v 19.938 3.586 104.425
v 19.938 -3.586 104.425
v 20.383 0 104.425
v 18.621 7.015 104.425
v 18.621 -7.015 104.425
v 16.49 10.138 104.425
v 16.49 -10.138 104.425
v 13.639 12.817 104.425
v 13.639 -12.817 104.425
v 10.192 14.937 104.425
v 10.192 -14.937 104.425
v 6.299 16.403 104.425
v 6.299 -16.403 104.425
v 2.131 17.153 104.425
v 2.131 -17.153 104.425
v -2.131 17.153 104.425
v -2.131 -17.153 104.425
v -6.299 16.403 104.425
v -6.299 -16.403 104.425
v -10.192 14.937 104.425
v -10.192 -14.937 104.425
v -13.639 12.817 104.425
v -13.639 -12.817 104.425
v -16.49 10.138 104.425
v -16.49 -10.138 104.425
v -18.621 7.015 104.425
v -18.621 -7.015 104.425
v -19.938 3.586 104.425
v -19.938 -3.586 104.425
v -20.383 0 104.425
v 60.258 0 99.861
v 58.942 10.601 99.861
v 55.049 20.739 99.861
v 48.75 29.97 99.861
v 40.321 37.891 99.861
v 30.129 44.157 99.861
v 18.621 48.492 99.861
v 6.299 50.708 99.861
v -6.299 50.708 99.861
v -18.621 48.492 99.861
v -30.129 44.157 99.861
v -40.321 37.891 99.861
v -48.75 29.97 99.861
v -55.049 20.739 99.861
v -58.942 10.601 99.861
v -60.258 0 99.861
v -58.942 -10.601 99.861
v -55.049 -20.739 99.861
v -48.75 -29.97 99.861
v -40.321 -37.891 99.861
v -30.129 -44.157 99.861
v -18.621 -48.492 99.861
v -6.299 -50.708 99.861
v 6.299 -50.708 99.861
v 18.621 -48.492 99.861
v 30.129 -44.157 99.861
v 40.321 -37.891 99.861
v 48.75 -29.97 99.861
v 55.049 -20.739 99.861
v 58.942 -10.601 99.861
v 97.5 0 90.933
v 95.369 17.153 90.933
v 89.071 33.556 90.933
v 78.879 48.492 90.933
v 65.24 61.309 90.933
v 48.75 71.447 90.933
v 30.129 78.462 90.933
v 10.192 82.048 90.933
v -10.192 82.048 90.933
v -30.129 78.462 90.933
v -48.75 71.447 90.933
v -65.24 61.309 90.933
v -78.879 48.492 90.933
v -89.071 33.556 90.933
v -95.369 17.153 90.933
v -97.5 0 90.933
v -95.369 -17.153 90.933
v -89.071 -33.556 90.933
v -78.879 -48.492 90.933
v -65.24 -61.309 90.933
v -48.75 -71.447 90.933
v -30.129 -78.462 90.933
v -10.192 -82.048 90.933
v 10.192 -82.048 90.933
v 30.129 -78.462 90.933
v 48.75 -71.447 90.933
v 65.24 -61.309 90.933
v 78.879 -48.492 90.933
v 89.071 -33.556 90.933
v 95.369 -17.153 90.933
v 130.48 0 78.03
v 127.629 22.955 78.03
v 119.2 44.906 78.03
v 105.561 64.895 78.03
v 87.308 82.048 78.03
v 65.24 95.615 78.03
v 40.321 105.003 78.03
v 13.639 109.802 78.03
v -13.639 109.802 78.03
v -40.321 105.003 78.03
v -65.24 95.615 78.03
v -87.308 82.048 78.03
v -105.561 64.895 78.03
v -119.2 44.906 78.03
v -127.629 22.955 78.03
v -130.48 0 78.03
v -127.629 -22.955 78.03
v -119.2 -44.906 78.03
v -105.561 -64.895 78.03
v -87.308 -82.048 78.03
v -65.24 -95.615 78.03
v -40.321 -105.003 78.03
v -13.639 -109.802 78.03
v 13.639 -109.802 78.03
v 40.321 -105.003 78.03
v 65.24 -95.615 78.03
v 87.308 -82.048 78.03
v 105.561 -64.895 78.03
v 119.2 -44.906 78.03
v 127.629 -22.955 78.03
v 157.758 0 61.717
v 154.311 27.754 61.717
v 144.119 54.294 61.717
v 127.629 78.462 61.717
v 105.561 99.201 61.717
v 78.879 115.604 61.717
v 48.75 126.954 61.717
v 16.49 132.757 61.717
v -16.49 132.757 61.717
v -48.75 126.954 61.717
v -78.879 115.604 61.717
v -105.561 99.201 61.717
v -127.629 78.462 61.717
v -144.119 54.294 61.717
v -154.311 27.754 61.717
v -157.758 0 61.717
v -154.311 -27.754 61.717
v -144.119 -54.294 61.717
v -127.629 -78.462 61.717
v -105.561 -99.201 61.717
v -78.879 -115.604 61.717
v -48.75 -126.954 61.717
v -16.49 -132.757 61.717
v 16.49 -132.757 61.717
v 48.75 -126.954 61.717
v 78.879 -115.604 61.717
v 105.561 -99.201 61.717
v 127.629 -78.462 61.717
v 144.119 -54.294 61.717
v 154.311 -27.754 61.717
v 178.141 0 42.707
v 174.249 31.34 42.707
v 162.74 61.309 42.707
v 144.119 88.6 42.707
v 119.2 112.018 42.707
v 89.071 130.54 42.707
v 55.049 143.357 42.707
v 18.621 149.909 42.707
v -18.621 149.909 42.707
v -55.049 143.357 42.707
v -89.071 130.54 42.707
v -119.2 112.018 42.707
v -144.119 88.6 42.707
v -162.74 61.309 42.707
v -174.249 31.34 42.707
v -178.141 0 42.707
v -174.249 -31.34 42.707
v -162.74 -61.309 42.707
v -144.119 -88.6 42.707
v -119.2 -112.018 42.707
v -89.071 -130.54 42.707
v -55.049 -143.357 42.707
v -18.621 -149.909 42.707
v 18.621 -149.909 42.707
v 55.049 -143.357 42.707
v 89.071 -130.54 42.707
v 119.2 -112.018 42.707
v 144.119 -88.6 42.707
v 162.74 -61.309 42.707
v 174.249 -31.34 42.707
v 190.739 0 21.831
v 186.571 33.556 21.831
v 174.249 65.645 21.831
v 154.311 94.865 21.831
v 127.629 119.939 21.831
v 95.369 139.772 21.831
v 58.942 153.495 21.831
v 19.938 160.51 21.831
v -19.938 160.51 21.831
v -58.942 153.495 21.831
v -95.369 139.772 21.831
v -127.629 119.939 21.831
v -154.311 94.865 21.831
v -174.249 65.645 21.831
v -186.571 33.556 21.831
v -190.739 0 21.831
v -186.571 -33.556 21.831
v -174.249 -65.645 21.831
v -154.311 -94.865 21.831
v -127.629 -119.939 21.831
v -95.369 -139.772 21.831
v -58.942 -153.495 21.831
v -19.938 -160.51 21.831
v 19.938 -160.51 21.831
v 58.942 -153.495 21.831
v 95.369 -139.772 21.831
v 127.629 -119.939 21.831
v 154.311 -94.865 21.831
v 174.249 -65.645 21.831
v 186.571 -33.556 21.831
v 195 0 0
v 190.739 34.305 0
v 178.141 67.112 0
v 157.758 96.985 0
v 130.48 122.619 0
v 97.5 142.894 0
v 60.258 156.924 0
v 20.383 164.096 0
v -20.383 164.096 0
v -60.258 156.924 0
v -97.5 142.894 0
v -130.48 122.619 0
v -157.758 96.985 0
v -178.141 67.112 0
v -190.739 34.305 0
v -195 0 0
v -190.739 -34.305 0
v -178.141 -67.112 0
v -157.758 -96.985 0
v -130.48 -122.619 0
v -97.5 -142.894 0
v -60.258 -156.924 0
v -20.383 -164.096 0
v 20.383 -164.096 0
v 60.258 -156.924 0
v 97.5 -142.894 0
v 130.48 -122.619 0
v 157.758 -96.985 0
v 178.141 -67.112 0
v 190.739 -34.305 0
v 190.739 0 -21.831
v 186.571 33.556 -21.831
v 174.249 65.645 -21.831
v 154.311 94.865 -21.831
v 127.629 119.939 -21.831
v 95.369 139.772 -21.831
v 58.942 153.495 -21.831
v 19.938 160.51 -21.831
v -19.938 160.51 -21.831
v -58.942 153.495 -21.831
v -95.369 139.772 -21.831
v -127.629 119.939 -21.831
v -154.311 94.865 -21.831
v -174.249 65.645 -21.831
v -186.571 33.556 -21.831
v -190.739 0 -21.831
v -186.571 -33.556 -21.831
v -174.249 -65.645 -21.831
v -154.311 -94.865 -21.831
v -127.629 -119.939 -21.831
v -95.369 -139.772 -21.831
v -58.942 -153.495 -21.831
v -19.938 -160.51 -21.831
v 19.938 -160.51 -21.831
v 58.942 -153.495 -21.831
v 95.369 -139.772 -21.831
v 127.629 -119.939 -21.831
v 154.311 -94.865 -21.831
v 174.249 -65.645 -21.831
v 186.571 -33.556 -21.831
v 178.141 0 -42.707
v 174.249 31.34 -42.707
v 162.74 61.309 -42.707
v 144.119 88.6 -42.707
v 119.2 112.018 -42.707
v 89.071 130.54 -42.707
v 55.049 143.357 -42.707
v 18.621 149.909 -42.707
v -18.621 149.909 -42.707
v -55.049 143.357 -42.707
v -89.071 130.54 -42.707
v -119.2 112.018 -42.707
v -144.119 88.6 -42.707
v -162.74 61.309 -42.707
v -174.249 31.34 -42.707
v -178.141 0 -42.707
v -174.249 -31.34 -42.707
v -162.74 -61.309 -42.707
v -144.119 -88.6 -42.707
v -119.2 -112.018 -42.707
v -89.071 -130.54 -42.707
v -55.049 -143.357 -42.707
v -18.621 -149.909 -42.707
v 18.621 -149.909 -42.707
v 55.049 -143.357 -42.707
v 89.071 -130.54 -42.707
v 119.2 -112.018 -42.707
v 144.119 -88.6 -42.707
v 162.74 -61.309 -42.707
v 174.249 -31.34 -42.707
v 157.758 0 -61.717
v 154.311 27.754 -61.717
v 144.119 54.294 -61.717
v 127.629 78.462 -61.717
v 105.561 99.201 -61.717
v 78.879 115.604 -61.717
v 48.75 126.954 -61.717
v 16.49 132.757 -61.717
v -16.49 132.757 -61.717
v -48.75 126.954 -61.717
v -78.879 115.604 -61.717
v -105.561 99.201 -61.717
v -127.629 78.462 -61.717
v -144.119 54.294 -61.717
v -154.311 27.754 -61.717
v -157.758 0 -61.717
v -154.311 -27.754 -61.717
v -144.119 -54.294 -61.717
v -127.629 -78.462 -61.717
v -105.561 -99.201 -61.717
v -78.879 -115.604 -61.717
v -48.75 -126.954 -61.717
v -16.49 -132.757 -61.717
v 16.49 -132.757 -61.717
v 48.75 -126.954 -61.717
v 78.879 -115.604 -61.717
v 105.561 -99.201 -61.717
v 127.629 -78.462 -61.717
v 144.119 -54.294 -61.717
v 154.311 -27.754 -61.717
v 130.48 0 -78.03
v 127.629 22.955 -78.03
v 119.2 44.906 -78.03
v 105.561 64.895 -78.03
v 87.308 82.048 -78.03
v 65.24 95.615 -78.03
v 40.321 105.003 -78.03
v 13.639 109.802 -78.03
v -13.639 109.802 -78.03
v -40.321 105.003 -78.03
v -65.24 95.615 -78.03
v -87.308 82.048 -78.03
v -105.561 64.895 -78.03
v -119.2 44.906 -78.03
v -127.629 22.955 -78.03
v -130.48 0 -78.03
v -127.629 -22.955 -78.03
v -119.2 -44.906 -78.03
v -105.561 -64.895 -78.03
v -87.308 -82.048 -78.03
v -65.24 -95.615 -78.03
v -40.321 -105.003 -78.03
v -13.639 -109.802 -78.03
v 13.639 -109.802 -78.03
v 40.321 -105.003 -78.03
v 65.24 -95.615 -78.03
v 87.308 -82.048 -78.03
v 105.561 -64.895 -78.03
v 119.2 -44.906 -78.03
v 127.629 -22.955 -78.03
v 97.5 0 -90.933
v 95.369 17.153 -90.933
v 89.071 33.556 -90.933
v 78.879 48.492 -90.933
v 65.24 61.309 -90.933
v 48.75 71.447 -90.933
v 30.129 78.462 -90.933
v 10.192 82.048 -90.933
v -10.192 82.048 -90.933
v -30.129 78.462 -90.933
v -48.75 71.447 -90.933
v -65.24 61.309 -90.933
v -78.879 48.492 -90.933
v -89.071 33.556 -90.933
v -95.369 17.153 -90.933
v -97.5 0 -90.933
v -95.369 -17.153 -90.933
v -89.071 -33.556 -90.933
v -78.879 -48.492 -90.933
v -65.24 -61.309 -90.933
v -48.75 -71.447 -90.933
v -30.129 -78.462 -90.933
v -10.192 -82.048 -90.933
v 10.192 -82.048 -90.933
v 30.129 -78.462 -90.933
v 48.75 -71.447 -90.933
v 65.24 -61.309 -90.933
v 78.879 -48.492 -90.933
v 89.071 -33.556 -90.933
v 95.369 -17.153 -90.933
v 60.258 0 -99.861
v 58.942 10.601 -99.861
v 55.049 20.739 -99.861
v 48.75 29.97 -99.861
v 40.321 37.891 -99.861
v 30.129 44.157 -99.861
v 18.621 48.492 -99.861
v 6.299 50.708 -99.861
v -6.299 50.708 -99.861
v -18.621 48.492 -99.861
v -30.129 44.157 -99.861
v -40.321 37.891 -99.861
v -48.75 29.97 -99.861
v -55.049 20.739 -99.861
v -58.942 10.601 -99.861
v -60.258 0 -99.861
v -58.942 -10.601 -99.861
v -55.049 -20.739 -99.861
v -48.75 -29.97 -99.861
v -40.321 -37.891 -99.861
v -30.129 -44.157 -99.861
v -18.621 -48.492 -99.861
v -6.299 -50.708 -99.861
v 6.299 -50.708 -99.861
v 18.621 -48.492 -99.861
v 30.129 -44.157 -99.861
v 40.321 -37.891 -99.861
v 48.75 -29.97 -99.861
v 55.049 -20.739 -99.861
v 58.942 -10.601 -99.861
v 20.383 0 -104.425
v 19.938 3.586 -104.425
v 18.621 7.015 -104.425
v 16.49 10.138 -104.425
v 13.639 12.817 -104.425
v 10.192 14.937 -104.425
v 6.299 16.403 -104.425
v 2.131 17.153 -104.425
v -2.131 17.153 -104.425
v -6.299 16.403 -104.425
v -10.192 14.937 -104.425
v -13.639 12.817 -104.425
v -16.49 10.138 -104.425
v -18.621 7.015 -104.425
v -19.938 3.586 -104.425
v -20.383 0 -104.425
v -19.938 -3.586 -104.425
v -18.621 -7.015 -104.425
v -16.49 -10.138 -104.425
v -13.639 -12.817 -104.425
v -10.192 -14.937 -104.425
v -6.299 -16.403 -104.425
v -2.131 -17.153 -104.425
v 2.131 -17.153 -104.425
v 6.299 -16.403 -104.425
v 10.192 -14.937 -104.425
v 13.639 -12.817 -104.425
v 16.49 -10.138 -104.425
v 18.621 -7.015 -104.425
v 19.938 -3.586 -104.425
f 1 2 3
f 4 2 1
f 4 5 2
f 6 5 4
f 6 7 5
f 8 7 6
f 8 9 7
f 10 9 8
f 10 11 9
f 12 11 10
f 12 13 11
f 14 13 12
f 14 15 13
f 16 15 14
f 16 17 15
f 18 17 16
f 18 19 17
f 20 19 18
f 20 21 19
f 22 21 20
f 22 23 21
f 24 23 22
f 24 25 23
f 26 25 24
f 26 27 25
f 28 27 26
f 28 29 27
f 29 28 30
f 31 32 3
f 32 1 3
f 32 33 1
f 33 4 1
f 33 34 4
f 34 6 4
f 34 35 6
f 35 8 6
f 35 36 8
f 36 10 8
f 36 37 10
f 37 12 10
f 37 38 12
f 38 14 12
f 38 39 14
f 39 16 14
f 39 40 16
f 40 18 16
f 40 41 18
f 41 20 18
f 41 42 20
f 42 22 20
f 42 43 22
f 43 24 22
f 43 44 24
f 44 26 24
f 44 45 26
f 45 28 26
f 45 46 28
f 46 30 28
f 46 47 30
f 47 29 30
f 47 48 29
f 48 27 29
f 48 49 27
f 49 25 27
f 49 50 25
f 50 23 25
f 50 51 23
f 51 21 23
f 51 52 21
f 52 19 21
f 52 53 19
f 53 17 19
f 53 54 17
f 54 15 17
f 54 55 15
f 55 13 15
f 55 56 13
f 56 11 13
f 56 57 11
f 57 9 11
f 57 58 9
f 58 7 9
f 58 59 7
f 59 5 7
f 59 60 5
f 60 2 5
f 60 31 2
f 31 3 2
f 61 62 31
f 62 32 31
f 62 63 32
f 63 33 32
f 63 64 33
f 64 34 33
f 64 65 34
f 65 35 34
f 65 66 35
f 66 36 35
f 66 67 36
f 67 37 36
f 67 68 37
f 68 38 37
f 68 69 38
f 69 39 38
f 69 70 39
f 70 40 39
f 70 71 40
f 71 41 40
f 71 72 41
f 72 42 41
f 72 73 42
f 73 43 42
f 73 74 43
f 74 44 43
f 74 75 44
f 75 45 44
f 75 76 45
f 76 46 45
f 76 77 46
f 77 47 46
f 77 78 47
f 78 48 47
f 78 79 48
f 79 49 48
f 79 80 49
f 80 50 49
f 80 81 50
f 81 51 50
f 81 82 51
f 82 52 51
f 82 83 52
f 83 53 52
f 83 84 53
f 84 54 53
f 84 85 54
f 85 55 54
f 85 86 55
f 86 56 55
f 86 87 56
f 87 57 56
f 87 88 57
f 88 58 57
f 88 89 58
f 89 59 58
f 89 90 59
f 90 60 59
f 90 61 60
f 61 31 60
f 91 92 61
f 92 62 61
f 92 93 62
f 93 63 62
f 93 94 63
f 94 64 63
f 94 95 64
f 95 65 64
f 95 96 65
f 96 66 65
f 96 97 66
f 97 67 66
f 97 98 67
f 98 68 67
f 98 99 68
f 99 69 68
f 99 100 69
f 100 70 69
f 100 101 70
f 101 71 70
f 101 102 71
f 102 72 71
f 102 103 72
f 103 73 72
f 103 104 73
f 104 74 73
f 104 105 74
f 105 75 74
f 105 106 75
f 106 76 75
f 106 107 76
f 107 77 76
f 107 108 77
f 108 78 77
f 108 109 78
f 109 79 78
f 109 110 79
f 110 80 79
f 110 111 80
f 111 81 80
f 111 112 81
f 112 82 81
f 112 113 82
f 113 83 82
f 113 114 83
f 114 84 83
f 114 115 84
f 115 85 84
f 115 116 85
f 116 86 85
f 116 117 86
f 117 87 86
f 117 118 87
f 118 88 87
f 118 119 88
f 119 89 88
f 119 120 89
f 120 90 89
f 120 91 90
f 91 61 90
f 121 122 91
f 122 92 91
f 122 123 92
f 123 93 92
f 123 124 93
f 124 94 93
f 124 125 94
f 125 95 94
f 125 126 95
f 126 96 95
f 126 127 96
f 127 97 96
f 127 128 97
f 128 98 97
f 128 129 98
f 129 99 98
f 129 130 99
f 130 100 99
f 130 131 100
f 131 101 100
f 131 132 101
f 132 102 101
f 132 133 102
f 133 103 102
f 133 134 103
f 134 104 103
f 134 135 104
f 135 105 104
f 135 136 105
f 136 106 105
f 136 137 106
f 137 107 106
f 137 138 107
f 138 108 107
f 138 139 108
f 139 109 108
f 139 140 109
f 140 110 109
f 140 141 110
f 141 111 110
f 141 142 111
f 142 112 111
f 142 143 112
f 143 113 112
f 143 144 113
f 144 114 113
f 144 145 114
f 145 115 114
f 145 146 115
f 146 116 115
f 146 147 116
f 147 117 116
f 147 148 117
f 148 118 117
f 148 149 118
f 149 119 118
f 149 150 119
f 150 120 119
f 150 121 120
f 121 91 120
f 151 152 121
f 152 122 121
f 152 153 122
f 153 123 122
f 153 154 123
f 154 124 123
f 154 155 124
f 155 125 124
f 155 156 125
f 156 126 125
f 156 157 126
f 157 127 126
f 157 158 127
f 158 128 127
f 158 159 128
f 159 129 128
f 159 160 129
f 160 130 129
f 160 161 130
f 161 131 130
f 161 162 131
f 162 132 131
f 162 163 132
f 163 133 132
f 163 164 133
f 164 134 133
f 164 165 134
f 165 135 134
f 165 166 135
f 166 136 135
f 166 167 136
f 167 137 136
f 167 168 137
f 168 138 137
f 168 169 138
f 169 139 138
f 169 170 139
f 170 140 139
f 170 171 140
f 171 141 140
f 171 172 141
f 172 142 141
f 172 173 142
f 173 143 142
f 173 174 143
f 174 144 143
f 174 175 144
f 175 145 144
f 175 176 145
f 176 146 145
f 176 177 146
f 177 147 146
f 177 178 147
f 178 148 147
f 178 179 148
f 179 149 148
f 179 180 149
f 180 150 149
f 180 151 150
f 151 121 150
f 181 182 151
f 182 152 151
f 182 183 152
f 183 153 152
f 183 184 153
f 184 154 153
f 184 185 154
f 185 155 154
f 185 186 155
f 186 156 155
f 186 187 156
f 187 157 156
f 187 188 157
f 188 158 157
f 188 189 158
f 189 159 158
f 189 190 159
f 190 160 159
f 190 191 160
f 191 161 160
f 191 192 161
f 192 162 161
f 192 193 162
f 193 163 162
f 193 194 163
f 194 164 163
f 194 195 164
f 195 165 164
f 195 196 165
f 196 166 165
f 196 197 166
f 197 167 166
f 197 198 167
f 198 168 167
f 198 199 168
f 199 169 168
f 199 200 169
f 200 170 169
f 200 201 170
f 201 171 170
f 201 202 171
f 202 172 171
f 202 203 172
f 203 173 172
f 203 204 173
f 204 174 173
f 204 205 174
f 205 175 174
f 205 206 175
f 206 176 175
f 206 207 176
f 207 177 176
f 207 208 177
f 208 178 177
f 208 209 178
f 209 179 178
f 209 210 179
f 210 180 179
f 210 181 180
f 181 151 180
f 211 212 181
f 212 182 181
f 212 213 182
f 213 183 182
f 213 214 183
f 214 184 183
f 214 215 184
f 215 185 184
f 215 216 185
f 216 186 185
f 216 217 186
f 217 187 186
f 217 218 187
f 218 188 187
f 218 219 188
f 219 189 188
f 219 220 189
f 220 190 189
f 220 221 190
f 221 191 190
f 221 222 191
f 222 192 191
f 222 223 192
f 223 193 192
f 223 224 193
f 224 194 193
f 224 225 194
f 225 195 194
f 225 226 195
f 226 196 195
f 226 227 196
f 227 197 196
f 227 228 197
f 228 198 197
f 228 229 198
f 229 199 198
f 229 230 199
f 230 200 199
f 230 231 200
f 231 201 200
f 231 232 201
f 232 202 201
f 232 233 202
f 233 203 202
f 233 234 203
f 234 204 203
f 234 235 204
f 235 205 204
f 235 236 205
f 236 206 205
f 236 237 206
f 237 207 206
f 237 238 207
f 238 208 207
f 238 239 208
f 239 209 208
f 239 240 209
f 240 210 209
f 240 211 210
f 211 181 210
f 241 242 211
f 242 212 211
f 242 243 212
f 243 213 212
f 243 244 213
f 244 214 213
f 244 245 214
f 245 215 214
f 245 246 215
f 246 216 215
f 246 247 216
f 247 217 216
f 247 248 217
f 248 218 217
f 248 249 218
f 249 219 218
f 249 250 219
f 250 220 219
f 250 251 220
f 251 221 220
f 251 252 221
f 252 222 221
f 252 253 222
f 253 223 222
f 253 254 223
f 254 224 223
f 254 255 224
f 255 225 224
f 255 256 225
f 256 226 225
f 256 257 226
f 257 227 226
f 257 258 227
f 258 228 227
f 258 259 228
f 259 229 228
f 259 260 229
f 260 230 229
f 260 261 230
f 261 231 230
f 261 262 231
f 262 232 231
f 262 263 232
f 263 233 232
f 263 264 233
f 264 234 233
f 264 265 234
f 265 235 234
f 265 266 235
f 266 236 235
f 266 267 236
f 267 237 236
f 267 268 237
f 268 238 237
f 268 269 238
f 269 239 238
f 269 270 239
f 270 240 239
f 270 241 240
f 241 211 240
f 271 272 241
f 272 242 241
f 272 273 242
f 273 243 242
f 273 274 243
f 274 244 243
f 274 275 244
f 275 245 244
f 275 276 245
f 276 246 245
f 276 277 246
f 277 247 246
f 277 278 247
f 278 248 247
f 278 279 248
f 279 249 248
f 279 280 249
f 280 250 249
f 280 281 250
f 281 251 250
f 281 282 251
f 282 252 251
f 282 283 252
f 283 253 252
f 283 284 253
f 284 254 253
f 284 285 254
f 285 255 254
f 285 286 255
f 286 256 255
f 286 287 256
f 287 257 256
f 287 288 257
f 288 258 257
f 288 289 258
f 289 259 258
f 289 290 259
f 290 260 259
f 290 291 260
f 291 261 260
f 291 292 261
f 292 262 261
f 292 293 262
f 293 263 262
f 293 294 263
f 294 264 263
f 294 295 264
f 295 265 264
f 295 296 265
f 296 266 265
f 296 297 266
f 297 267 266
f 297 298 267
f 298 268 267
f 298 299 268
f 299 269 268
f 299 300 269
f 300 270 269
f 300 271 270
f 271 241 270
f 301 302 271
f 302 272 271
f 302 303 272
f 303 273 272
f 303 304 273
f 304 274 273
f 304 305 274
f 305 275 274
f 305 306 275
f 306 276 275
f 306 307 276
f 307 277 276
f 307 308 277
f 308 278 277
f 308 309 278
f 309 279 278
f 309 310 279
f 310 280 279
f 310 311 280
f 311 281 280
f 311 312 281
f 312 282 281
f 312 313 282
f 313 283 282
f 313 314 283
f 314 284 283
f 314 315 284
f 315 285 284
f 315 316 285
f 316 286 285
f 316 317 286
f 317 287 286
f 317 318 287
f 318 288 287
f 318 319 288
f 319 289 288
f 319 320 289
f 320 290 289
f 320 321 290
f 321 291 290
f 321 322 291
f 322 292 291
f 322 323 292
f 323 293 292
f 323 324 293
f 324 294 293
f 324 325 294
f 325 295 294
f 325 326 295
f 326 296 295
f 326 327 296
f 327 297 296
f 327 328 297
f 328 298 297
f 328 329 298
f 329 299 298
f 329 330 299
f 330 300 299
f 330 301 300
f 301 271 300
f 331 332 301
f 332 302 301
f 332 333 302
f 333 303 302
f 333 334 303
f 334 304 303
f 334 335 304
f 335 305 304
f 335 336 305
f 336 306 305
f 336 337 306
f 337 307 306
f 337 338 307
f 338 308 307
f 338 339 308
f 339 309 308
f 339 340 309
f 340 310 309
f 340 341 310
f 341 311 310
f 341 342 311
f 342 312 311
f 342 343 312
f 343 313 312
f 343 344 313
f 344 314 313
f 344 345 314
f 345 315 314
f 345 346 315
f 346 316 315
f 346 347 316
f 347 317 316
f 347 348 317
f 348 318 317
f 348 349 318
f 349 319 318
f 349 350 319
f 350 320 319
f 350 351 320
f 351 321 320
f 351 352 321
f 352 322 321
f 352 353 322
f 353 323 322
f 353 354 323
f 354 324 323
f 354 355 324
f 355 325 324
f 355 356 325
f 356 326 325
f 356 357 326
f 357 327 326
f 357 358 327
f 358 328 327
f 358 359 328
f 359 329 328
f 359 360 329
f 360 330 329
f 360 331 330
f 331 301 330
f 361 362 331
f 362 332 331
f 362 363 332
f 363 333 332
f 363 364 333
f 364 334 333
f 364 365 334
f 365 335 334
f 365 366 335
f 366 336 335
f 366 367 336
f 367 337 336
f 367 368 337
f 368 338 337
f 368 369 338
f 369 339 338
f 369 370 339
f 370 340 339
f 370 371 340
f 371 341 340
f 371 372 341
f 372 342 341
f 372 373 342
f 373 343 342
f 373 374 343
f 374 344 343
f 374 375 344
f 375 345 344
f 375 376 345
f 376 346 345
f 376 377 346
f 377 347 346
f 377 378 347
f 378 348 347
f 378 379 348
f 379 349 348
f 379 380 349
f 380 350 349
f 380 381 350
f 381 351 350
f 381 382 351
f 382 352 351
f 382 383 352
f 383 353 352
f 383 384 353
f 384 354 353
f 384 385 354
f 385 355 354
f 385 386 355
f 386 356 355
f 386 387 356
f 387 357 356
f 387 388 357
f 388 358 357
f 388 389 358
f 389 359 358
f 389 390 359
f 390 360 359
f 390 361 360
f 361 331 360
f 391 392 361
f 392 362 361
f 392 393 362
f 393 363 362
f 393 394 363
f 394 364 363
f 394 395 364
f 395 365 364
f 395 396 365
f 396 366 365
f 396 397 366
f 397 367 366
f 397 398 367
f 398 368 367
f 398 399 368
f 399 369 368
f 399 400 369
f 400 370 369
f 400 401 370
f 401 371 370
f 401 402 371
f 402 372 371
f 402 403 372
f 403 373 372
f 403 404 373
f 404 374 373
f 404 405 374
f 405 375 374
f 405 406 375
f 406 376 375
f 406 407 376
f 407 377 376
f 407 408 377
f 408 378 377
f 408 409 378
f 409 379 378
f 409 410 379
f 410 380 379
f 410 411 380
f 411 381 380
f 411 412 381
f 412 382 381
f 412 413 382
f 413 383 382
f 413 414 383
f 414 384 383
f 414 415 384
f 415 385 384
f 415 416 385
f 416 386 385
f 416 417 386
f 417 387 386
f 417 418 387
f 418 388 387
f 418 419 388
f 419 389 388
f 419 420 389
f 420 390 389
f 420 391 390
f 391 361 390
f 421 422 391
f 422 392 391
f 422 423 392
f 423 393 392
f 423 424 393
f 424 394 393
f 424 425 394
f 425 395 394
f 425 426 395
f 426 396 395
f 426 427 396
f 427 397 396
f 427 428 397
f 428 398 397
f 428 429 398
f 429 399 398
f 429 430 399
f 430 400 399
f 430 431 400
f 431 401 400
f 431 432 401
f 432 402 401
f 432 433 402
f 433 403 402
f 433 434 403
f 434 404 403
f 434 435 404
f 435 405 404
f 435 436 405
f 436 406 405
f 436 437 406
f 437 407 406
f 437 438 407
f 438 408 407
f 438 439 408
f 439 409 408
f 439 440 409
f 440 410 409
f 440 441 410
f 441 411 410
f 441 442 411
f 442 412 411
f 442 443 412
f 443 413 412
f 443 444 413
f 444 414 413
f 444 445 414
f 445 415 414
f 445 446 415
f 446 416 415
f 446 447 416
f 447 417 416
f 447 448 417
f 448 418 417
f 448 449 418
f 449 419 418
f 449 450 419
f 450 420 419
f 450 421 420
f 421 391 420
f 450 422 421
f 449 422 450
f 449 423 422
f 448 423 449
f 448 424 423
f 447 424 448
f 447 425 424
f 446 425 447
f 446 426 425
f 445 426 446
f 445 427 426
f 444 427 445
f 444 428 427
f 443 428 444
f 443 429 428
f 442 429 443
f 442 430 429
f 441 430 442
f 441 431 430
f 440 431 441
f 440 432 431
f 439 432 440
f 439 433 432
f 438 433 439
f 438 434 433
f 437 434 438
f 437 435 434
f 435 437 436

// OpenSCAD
// Generated by SolidPython 1.0.1 on 2020-07-29 00:46:50


scale(v = [13, 11, 7]) {
	sphere(r = 15);
}
/***********************************************
*********      SolidPython code:      **********
************************************************
 
# import packages: SolidPython
from solid import *
from solid.utils import *
from itertools import chain, combinations, permutations


class Resize:

    def __init__(self, scad_file):
        self.scad_file = scad_file
        #self.scad_file = import_scad(scad_file)
        # cone/cylinder param:
        self.r1 = 0
        self.r2 = 0
        self.h = 0
        # rectangular prism param:
        self.w = 0
        self.l = 0
        # ellipse param:
        self.r = 0

    # import OpenScad code (file name corresponds to shape)


    # classify shape + parameters
    def assign(self, param1, param2, param3):
        if self.scad_file == 'cone.scad':
            self.r1 = param1
            self.r2 = param2
            self.h = param3
        elif self.scad_file == 'cylinder.scad':
            self.r1 = param1
            self.r2 = param2
            self.h = param3
        elif self.scad_file == 'rectangularPrism.scad':
            self.h = param1
            self.l = param2
            self.w = param3
        else:
            self.r = param1
            self.h = param2

    # resize parameters
    def iterate(self):
        x = range(3, 20, 2)
        i = 1
        if self.scad_file == 'cone.scad':
            tempList = list(permutations(x, 2))
            for temp in tempList:
                param1 = temp[0]
                param2 = temp[1]
                filepath = 'produced_scad_files/' + 'cone' + str(param1) + '_' + str(param2) + '_' + '.scad'
                scad_render_to_file(cylinder(h=param1, r1=param2, r2=0), filepath)

        elif self.scad_file == 'cylinder.scad':
            tempList = list(permutations(x, 3))
            for temp in tempList:
                param1 = temp[0]
                param2 = temp[1]
                filepath = 'produced_scad_files/' + 'cylinder' + str(param1) + '_' + str(param2) + '_' + '.scad'
                scad_render_to_file(cylinder(h=param1, r1=param2, r2=param2), filepath)

        elif self.scad_file == 'rectangularPrism.scad':
            tempList = list(permutations(x, 3))
            for temp in tempList:
                param1 = temp[0]
                param2 = temp[1]
                param3 = temp[2]
                filepath = 'produced_scad_files/' + 'rectangularPrism' + str(param1) + '_' + str(param2) + '_' + str(
                    param3) + '.scad'
                scad_render_to_file(cube(size=(param1, param2, param3)), filepath)

        elif self.scad_file == 'ellipse.scad':
            tempList = list(permutations(x, 4))
            for temp in tempList:
                param1 = temp[0]
                param2 = temp[1]
                param3 = temp[2]
                param4 = temp[3]
                filepath = 'produced_scad_files/' + 'ellipse' + str(param1) + '_' + str(param2) + '_' + str(param3) + '_' + str(param4) + '.scad'
                scad_render_to_file(scale([param1, param2, param3])(sphere(r=param4)), filepath)

    def render_to_scadfile(self):
        scad_render_to_file(scad, 'example.scad') 
 
************************************************/
